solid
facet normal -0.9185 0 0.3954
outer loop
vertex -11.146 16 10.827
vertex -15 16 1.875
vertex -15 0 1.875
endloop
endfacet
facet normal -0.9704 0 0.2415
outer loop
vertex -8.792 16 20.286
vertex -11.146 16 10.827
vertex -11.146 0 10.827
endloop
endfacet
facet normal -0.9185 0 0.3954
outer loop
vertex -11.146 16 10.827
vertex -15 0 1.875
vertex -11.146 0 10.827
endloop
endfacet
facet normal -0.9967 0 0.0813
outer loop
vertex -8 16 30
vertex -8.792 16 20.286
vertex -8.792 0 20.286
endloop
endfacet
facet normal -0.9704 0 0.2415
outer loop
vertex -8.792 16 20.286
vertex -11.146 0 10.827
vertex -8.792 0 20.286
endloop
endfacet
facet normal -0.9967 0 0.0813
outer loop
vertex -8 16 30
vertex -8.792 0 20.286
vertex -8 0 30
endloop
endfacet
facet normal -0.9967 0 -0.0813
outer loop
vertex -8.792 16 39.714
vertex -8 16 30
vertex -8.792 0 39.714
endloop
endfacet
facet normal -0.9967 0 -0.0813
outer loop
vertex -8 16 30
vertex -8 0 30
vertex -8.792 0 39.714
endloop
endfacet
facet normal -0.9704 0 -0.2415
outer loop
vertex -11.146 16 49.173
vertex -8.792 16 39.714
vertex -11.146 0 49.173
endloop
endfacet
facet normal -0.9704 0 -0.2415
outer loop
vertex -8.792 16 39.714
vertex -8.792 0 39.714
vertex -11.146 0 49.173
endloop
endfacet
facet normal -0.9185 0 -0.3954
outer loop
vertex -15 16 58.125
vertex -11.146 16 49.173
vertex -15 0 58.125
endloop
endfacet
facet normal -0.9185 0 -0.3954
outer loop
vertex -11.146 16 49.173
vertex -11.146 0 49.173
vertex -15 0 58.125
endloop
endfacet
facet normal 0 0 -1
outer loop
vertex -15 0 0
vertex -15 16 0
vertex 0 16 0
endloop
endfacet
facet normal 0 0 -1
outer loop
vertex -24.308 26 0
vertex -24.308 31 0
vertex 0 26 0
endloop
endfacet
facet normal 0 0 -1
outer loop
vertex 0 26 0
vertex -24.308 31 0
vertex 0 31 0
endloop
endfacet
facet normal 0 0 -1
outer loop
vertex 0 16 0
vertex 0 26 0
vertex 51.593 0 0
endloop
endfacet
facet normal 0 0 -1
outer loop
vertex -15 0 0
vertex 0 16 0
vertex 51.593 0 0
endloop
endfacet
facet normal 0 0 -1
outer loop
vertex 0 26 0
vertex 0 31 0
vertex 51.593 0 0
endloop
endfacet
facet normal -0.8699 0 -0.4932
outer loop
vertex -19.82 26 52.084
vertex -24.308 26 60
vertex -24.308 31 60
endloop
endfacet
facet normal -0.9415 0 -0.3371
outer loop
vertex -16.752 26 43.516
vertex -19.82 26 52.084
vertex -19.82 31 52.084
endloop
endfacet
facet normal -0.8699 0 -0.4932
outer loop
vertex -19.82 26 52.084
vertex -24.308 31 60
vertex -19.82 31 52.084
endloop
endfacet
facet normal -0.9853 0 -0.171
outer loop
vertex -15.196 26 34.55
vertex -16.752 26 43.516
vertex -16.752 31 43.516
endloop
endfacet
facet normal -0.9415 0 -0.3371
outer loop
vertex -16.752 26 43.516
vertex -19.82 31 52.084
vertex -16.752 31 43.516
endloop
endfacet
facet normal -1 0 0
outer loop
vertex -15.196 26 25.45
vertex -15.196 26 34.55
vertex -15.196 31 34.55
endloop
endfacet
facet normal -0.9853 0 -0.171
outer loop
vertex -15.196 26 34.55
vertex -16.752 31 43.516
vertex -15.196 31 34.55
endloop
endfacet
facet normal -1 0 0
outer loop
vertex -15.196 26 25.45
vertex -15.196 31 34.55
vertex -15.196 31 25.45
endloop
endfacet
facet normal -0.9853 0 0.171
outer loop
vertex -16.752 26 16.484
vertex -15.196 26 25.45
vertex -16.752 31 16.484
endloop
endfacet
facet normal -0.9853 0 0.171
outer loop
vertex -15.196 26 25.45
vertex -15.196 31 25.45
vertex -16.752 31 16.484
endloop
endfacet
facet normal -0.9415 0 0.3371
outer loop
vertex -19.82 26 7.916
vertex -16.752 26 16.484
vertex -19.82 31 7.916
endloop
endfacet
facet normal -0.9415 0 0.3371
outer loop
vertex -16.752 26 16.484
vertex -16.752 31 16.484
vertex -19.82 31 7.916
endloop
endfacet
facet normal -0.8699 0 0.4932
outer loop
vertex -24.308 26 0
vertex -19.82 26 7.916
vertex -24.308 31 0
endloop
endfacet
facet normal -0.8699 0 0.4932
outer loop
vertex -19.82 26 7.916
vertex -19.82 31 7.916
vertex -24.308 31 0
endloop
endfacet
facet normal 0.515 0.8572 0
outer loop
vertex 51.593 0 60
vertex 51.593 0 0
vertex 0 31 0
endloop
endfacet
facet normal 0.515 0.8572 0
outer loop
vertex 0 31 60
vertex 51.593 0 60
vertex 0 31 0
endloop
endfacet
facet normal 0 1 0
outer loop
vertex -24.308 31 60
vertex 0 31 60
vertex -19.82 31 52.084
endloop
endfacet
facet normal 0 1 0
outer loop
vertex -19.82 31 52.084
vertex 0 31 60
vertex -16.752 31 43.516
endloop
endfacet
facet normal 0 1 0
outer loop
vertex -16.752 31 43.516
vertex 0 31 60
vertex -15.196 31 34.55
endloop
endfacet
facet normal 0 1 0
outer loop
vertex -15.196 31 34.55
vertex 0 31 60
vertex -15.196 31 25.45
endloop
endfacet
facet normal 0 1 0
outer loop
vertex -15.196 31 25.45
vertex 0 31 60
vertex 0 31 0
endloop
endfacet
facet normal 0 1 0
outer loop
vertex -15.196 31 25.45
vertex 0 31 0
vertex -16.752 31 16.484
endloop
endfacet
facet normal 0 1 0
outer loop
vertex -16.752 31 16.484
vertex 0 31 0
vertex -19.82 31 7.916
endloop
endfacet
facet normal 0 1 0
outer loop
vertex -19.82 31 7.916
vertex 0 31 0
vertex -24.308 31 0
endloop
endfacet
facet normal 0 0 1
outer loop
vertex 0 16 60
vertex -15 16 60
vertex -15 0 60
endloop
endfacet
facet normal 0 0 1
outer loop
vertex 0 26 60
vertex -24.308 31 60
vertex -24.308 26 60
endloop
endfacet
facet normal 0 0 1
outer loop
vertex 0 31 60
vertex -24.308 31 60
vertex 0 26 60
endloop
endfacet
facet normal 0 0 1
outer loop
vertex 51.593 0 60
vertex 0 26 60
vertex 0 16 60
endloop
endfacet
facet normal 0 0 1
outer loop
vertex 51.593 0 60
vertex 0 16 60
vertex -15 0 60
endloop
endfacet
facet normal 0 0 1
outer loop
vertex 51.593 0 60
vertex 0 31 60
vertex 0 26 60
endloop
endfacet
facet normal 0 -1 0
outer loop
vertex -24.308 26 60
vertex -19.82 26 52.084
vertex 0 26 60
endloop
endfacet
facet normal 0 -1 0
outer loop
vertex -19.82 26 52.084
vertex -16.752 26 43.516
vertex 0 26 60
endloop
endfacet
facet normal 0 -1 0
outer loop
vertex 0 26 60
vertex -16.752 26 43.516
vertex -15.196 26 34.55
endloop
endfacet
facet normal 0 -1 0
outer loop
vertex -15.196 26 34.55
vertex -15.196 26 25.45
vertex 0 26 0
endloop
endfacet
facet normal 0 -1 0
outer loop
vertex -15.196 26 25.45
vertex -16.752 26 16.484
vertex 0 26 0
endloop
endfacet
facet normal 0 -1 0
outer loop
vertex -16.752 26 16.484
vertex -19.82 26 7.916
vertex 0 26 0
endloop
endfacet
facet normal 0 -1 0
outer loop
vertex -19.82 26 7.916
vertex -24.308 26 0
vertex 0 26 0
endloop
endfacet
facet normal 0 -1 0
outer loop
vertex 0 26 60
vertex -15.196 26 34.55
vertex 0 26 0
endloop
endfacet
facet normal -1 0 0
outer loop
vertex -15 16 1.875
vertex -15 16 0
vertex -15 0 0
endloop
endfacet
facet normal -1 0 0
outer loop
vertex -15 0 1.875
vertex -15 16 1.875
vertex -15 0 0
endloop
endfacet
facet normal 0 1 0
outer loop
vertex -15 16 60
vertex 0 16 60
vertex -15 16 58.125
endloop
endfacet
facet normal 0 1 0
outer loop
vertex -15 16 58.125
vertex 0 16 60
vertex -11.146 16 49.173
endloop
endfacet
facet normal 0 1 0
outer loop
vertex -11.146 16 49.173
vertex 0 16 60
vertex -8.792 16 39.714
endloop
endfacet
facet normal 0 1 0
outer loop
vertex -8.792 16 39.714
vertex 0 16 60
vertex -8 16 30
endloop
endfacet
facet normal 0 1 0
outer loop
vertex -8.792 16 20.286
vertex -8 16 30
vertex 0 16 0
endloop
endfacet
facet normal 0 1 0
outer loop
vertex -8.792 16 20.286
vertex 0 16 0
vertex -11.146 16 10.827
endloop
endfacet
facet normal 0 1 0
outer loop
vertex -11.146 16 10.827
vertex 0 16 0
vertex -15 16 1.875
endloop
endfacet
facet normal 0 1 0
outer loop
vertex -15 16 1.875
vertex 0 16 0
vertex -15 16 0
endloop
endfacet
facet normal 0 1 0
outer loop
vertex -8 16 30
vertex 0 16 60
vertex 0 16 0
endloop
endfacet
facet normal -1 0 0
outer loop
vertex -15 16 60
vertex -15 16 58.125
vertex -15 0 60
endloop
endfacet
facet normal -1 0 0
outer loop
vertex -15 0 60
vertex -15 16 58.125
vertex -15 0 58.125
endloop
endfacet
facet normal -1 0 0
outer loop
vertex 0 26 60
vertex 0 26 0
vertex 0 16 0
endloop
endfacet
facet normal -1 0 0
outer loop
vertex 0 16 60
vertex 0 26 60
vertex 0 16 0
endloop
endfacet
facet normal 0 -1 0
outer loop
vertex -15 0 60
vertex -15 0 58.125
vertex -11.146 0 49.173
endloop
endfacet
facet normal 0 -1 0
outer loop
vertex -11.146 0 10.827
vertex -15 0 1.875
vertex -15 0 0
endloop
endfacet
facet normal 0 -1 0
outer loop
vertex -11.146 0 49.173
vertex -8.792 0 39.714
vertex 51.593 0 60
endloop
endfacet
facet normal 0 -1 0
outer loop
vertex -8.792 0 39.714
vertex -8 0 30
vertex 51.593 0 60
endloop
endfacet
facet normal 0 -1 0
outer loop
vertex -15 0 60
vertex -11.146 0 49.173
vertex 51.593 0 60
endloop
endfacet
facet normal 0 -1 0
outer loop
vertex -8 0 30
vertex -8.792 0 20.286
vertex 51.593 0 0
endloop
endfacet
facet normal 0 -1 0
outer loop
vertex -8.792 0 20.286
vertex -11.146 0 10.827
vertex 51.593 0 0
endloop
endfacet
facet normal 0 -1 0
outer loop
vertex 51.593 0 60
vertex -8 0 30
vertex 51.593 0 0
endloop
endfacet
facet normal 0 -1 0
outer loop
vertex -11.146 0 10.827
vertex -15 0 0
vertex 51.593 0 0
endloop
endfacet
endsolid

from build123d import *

# Parameters (mm, degrees)
ESTRUSIONE_ESTRUSIONE1_DEPTH = 60
SCHIZZO2_R                   = 53
TAGLIO_ESTRUSIONE1_DEPTH     = 60
SCHIZZO3_R                   = 60
TAGLIO_ESTRUSIONE2_DEPTH     = 21


with BuildPart() as part:
    # Schizzo1 → Estrusione-Estrusione1 (new body)
    with BuildSketch(Plane.XY):
        Polygon((-65, 26), (0, 26), (0, 16), (-15, 16), (-15, 0), (51.592663953, 0), (0, 31), (-65, 31), align=None)
    extrude(amount=ESTRUSIONE_ESTRUSIONE1_DEPTH)

    # Schizzo2 → Taglio-Estrusione1 (cut)
    with BuildSketch(Plane(origin=(0, 31, 0), x_dir=(1, 0, 0), z_dir=(0, 1, 0))):
        with Locations((-68, -30)):
            Circle(SCHIZZO2_R)
    extrude(amount=-TAGLIO_ESTRUSIONE1_DEPTH, mode=Mode.SUBTRACT)

    # Schizzo3 → Taglio-Estrusione2 (cut)
    with BuildSketch(Plane.XZ):
        with Locations((-68, 30)):
            Circle(SCHIZZO3_R)
    extrude(amount=-TAGLIO_ESTRUSIONE2_DEPTH, mode=Mode.SUBTRACT)


solid = part.part
